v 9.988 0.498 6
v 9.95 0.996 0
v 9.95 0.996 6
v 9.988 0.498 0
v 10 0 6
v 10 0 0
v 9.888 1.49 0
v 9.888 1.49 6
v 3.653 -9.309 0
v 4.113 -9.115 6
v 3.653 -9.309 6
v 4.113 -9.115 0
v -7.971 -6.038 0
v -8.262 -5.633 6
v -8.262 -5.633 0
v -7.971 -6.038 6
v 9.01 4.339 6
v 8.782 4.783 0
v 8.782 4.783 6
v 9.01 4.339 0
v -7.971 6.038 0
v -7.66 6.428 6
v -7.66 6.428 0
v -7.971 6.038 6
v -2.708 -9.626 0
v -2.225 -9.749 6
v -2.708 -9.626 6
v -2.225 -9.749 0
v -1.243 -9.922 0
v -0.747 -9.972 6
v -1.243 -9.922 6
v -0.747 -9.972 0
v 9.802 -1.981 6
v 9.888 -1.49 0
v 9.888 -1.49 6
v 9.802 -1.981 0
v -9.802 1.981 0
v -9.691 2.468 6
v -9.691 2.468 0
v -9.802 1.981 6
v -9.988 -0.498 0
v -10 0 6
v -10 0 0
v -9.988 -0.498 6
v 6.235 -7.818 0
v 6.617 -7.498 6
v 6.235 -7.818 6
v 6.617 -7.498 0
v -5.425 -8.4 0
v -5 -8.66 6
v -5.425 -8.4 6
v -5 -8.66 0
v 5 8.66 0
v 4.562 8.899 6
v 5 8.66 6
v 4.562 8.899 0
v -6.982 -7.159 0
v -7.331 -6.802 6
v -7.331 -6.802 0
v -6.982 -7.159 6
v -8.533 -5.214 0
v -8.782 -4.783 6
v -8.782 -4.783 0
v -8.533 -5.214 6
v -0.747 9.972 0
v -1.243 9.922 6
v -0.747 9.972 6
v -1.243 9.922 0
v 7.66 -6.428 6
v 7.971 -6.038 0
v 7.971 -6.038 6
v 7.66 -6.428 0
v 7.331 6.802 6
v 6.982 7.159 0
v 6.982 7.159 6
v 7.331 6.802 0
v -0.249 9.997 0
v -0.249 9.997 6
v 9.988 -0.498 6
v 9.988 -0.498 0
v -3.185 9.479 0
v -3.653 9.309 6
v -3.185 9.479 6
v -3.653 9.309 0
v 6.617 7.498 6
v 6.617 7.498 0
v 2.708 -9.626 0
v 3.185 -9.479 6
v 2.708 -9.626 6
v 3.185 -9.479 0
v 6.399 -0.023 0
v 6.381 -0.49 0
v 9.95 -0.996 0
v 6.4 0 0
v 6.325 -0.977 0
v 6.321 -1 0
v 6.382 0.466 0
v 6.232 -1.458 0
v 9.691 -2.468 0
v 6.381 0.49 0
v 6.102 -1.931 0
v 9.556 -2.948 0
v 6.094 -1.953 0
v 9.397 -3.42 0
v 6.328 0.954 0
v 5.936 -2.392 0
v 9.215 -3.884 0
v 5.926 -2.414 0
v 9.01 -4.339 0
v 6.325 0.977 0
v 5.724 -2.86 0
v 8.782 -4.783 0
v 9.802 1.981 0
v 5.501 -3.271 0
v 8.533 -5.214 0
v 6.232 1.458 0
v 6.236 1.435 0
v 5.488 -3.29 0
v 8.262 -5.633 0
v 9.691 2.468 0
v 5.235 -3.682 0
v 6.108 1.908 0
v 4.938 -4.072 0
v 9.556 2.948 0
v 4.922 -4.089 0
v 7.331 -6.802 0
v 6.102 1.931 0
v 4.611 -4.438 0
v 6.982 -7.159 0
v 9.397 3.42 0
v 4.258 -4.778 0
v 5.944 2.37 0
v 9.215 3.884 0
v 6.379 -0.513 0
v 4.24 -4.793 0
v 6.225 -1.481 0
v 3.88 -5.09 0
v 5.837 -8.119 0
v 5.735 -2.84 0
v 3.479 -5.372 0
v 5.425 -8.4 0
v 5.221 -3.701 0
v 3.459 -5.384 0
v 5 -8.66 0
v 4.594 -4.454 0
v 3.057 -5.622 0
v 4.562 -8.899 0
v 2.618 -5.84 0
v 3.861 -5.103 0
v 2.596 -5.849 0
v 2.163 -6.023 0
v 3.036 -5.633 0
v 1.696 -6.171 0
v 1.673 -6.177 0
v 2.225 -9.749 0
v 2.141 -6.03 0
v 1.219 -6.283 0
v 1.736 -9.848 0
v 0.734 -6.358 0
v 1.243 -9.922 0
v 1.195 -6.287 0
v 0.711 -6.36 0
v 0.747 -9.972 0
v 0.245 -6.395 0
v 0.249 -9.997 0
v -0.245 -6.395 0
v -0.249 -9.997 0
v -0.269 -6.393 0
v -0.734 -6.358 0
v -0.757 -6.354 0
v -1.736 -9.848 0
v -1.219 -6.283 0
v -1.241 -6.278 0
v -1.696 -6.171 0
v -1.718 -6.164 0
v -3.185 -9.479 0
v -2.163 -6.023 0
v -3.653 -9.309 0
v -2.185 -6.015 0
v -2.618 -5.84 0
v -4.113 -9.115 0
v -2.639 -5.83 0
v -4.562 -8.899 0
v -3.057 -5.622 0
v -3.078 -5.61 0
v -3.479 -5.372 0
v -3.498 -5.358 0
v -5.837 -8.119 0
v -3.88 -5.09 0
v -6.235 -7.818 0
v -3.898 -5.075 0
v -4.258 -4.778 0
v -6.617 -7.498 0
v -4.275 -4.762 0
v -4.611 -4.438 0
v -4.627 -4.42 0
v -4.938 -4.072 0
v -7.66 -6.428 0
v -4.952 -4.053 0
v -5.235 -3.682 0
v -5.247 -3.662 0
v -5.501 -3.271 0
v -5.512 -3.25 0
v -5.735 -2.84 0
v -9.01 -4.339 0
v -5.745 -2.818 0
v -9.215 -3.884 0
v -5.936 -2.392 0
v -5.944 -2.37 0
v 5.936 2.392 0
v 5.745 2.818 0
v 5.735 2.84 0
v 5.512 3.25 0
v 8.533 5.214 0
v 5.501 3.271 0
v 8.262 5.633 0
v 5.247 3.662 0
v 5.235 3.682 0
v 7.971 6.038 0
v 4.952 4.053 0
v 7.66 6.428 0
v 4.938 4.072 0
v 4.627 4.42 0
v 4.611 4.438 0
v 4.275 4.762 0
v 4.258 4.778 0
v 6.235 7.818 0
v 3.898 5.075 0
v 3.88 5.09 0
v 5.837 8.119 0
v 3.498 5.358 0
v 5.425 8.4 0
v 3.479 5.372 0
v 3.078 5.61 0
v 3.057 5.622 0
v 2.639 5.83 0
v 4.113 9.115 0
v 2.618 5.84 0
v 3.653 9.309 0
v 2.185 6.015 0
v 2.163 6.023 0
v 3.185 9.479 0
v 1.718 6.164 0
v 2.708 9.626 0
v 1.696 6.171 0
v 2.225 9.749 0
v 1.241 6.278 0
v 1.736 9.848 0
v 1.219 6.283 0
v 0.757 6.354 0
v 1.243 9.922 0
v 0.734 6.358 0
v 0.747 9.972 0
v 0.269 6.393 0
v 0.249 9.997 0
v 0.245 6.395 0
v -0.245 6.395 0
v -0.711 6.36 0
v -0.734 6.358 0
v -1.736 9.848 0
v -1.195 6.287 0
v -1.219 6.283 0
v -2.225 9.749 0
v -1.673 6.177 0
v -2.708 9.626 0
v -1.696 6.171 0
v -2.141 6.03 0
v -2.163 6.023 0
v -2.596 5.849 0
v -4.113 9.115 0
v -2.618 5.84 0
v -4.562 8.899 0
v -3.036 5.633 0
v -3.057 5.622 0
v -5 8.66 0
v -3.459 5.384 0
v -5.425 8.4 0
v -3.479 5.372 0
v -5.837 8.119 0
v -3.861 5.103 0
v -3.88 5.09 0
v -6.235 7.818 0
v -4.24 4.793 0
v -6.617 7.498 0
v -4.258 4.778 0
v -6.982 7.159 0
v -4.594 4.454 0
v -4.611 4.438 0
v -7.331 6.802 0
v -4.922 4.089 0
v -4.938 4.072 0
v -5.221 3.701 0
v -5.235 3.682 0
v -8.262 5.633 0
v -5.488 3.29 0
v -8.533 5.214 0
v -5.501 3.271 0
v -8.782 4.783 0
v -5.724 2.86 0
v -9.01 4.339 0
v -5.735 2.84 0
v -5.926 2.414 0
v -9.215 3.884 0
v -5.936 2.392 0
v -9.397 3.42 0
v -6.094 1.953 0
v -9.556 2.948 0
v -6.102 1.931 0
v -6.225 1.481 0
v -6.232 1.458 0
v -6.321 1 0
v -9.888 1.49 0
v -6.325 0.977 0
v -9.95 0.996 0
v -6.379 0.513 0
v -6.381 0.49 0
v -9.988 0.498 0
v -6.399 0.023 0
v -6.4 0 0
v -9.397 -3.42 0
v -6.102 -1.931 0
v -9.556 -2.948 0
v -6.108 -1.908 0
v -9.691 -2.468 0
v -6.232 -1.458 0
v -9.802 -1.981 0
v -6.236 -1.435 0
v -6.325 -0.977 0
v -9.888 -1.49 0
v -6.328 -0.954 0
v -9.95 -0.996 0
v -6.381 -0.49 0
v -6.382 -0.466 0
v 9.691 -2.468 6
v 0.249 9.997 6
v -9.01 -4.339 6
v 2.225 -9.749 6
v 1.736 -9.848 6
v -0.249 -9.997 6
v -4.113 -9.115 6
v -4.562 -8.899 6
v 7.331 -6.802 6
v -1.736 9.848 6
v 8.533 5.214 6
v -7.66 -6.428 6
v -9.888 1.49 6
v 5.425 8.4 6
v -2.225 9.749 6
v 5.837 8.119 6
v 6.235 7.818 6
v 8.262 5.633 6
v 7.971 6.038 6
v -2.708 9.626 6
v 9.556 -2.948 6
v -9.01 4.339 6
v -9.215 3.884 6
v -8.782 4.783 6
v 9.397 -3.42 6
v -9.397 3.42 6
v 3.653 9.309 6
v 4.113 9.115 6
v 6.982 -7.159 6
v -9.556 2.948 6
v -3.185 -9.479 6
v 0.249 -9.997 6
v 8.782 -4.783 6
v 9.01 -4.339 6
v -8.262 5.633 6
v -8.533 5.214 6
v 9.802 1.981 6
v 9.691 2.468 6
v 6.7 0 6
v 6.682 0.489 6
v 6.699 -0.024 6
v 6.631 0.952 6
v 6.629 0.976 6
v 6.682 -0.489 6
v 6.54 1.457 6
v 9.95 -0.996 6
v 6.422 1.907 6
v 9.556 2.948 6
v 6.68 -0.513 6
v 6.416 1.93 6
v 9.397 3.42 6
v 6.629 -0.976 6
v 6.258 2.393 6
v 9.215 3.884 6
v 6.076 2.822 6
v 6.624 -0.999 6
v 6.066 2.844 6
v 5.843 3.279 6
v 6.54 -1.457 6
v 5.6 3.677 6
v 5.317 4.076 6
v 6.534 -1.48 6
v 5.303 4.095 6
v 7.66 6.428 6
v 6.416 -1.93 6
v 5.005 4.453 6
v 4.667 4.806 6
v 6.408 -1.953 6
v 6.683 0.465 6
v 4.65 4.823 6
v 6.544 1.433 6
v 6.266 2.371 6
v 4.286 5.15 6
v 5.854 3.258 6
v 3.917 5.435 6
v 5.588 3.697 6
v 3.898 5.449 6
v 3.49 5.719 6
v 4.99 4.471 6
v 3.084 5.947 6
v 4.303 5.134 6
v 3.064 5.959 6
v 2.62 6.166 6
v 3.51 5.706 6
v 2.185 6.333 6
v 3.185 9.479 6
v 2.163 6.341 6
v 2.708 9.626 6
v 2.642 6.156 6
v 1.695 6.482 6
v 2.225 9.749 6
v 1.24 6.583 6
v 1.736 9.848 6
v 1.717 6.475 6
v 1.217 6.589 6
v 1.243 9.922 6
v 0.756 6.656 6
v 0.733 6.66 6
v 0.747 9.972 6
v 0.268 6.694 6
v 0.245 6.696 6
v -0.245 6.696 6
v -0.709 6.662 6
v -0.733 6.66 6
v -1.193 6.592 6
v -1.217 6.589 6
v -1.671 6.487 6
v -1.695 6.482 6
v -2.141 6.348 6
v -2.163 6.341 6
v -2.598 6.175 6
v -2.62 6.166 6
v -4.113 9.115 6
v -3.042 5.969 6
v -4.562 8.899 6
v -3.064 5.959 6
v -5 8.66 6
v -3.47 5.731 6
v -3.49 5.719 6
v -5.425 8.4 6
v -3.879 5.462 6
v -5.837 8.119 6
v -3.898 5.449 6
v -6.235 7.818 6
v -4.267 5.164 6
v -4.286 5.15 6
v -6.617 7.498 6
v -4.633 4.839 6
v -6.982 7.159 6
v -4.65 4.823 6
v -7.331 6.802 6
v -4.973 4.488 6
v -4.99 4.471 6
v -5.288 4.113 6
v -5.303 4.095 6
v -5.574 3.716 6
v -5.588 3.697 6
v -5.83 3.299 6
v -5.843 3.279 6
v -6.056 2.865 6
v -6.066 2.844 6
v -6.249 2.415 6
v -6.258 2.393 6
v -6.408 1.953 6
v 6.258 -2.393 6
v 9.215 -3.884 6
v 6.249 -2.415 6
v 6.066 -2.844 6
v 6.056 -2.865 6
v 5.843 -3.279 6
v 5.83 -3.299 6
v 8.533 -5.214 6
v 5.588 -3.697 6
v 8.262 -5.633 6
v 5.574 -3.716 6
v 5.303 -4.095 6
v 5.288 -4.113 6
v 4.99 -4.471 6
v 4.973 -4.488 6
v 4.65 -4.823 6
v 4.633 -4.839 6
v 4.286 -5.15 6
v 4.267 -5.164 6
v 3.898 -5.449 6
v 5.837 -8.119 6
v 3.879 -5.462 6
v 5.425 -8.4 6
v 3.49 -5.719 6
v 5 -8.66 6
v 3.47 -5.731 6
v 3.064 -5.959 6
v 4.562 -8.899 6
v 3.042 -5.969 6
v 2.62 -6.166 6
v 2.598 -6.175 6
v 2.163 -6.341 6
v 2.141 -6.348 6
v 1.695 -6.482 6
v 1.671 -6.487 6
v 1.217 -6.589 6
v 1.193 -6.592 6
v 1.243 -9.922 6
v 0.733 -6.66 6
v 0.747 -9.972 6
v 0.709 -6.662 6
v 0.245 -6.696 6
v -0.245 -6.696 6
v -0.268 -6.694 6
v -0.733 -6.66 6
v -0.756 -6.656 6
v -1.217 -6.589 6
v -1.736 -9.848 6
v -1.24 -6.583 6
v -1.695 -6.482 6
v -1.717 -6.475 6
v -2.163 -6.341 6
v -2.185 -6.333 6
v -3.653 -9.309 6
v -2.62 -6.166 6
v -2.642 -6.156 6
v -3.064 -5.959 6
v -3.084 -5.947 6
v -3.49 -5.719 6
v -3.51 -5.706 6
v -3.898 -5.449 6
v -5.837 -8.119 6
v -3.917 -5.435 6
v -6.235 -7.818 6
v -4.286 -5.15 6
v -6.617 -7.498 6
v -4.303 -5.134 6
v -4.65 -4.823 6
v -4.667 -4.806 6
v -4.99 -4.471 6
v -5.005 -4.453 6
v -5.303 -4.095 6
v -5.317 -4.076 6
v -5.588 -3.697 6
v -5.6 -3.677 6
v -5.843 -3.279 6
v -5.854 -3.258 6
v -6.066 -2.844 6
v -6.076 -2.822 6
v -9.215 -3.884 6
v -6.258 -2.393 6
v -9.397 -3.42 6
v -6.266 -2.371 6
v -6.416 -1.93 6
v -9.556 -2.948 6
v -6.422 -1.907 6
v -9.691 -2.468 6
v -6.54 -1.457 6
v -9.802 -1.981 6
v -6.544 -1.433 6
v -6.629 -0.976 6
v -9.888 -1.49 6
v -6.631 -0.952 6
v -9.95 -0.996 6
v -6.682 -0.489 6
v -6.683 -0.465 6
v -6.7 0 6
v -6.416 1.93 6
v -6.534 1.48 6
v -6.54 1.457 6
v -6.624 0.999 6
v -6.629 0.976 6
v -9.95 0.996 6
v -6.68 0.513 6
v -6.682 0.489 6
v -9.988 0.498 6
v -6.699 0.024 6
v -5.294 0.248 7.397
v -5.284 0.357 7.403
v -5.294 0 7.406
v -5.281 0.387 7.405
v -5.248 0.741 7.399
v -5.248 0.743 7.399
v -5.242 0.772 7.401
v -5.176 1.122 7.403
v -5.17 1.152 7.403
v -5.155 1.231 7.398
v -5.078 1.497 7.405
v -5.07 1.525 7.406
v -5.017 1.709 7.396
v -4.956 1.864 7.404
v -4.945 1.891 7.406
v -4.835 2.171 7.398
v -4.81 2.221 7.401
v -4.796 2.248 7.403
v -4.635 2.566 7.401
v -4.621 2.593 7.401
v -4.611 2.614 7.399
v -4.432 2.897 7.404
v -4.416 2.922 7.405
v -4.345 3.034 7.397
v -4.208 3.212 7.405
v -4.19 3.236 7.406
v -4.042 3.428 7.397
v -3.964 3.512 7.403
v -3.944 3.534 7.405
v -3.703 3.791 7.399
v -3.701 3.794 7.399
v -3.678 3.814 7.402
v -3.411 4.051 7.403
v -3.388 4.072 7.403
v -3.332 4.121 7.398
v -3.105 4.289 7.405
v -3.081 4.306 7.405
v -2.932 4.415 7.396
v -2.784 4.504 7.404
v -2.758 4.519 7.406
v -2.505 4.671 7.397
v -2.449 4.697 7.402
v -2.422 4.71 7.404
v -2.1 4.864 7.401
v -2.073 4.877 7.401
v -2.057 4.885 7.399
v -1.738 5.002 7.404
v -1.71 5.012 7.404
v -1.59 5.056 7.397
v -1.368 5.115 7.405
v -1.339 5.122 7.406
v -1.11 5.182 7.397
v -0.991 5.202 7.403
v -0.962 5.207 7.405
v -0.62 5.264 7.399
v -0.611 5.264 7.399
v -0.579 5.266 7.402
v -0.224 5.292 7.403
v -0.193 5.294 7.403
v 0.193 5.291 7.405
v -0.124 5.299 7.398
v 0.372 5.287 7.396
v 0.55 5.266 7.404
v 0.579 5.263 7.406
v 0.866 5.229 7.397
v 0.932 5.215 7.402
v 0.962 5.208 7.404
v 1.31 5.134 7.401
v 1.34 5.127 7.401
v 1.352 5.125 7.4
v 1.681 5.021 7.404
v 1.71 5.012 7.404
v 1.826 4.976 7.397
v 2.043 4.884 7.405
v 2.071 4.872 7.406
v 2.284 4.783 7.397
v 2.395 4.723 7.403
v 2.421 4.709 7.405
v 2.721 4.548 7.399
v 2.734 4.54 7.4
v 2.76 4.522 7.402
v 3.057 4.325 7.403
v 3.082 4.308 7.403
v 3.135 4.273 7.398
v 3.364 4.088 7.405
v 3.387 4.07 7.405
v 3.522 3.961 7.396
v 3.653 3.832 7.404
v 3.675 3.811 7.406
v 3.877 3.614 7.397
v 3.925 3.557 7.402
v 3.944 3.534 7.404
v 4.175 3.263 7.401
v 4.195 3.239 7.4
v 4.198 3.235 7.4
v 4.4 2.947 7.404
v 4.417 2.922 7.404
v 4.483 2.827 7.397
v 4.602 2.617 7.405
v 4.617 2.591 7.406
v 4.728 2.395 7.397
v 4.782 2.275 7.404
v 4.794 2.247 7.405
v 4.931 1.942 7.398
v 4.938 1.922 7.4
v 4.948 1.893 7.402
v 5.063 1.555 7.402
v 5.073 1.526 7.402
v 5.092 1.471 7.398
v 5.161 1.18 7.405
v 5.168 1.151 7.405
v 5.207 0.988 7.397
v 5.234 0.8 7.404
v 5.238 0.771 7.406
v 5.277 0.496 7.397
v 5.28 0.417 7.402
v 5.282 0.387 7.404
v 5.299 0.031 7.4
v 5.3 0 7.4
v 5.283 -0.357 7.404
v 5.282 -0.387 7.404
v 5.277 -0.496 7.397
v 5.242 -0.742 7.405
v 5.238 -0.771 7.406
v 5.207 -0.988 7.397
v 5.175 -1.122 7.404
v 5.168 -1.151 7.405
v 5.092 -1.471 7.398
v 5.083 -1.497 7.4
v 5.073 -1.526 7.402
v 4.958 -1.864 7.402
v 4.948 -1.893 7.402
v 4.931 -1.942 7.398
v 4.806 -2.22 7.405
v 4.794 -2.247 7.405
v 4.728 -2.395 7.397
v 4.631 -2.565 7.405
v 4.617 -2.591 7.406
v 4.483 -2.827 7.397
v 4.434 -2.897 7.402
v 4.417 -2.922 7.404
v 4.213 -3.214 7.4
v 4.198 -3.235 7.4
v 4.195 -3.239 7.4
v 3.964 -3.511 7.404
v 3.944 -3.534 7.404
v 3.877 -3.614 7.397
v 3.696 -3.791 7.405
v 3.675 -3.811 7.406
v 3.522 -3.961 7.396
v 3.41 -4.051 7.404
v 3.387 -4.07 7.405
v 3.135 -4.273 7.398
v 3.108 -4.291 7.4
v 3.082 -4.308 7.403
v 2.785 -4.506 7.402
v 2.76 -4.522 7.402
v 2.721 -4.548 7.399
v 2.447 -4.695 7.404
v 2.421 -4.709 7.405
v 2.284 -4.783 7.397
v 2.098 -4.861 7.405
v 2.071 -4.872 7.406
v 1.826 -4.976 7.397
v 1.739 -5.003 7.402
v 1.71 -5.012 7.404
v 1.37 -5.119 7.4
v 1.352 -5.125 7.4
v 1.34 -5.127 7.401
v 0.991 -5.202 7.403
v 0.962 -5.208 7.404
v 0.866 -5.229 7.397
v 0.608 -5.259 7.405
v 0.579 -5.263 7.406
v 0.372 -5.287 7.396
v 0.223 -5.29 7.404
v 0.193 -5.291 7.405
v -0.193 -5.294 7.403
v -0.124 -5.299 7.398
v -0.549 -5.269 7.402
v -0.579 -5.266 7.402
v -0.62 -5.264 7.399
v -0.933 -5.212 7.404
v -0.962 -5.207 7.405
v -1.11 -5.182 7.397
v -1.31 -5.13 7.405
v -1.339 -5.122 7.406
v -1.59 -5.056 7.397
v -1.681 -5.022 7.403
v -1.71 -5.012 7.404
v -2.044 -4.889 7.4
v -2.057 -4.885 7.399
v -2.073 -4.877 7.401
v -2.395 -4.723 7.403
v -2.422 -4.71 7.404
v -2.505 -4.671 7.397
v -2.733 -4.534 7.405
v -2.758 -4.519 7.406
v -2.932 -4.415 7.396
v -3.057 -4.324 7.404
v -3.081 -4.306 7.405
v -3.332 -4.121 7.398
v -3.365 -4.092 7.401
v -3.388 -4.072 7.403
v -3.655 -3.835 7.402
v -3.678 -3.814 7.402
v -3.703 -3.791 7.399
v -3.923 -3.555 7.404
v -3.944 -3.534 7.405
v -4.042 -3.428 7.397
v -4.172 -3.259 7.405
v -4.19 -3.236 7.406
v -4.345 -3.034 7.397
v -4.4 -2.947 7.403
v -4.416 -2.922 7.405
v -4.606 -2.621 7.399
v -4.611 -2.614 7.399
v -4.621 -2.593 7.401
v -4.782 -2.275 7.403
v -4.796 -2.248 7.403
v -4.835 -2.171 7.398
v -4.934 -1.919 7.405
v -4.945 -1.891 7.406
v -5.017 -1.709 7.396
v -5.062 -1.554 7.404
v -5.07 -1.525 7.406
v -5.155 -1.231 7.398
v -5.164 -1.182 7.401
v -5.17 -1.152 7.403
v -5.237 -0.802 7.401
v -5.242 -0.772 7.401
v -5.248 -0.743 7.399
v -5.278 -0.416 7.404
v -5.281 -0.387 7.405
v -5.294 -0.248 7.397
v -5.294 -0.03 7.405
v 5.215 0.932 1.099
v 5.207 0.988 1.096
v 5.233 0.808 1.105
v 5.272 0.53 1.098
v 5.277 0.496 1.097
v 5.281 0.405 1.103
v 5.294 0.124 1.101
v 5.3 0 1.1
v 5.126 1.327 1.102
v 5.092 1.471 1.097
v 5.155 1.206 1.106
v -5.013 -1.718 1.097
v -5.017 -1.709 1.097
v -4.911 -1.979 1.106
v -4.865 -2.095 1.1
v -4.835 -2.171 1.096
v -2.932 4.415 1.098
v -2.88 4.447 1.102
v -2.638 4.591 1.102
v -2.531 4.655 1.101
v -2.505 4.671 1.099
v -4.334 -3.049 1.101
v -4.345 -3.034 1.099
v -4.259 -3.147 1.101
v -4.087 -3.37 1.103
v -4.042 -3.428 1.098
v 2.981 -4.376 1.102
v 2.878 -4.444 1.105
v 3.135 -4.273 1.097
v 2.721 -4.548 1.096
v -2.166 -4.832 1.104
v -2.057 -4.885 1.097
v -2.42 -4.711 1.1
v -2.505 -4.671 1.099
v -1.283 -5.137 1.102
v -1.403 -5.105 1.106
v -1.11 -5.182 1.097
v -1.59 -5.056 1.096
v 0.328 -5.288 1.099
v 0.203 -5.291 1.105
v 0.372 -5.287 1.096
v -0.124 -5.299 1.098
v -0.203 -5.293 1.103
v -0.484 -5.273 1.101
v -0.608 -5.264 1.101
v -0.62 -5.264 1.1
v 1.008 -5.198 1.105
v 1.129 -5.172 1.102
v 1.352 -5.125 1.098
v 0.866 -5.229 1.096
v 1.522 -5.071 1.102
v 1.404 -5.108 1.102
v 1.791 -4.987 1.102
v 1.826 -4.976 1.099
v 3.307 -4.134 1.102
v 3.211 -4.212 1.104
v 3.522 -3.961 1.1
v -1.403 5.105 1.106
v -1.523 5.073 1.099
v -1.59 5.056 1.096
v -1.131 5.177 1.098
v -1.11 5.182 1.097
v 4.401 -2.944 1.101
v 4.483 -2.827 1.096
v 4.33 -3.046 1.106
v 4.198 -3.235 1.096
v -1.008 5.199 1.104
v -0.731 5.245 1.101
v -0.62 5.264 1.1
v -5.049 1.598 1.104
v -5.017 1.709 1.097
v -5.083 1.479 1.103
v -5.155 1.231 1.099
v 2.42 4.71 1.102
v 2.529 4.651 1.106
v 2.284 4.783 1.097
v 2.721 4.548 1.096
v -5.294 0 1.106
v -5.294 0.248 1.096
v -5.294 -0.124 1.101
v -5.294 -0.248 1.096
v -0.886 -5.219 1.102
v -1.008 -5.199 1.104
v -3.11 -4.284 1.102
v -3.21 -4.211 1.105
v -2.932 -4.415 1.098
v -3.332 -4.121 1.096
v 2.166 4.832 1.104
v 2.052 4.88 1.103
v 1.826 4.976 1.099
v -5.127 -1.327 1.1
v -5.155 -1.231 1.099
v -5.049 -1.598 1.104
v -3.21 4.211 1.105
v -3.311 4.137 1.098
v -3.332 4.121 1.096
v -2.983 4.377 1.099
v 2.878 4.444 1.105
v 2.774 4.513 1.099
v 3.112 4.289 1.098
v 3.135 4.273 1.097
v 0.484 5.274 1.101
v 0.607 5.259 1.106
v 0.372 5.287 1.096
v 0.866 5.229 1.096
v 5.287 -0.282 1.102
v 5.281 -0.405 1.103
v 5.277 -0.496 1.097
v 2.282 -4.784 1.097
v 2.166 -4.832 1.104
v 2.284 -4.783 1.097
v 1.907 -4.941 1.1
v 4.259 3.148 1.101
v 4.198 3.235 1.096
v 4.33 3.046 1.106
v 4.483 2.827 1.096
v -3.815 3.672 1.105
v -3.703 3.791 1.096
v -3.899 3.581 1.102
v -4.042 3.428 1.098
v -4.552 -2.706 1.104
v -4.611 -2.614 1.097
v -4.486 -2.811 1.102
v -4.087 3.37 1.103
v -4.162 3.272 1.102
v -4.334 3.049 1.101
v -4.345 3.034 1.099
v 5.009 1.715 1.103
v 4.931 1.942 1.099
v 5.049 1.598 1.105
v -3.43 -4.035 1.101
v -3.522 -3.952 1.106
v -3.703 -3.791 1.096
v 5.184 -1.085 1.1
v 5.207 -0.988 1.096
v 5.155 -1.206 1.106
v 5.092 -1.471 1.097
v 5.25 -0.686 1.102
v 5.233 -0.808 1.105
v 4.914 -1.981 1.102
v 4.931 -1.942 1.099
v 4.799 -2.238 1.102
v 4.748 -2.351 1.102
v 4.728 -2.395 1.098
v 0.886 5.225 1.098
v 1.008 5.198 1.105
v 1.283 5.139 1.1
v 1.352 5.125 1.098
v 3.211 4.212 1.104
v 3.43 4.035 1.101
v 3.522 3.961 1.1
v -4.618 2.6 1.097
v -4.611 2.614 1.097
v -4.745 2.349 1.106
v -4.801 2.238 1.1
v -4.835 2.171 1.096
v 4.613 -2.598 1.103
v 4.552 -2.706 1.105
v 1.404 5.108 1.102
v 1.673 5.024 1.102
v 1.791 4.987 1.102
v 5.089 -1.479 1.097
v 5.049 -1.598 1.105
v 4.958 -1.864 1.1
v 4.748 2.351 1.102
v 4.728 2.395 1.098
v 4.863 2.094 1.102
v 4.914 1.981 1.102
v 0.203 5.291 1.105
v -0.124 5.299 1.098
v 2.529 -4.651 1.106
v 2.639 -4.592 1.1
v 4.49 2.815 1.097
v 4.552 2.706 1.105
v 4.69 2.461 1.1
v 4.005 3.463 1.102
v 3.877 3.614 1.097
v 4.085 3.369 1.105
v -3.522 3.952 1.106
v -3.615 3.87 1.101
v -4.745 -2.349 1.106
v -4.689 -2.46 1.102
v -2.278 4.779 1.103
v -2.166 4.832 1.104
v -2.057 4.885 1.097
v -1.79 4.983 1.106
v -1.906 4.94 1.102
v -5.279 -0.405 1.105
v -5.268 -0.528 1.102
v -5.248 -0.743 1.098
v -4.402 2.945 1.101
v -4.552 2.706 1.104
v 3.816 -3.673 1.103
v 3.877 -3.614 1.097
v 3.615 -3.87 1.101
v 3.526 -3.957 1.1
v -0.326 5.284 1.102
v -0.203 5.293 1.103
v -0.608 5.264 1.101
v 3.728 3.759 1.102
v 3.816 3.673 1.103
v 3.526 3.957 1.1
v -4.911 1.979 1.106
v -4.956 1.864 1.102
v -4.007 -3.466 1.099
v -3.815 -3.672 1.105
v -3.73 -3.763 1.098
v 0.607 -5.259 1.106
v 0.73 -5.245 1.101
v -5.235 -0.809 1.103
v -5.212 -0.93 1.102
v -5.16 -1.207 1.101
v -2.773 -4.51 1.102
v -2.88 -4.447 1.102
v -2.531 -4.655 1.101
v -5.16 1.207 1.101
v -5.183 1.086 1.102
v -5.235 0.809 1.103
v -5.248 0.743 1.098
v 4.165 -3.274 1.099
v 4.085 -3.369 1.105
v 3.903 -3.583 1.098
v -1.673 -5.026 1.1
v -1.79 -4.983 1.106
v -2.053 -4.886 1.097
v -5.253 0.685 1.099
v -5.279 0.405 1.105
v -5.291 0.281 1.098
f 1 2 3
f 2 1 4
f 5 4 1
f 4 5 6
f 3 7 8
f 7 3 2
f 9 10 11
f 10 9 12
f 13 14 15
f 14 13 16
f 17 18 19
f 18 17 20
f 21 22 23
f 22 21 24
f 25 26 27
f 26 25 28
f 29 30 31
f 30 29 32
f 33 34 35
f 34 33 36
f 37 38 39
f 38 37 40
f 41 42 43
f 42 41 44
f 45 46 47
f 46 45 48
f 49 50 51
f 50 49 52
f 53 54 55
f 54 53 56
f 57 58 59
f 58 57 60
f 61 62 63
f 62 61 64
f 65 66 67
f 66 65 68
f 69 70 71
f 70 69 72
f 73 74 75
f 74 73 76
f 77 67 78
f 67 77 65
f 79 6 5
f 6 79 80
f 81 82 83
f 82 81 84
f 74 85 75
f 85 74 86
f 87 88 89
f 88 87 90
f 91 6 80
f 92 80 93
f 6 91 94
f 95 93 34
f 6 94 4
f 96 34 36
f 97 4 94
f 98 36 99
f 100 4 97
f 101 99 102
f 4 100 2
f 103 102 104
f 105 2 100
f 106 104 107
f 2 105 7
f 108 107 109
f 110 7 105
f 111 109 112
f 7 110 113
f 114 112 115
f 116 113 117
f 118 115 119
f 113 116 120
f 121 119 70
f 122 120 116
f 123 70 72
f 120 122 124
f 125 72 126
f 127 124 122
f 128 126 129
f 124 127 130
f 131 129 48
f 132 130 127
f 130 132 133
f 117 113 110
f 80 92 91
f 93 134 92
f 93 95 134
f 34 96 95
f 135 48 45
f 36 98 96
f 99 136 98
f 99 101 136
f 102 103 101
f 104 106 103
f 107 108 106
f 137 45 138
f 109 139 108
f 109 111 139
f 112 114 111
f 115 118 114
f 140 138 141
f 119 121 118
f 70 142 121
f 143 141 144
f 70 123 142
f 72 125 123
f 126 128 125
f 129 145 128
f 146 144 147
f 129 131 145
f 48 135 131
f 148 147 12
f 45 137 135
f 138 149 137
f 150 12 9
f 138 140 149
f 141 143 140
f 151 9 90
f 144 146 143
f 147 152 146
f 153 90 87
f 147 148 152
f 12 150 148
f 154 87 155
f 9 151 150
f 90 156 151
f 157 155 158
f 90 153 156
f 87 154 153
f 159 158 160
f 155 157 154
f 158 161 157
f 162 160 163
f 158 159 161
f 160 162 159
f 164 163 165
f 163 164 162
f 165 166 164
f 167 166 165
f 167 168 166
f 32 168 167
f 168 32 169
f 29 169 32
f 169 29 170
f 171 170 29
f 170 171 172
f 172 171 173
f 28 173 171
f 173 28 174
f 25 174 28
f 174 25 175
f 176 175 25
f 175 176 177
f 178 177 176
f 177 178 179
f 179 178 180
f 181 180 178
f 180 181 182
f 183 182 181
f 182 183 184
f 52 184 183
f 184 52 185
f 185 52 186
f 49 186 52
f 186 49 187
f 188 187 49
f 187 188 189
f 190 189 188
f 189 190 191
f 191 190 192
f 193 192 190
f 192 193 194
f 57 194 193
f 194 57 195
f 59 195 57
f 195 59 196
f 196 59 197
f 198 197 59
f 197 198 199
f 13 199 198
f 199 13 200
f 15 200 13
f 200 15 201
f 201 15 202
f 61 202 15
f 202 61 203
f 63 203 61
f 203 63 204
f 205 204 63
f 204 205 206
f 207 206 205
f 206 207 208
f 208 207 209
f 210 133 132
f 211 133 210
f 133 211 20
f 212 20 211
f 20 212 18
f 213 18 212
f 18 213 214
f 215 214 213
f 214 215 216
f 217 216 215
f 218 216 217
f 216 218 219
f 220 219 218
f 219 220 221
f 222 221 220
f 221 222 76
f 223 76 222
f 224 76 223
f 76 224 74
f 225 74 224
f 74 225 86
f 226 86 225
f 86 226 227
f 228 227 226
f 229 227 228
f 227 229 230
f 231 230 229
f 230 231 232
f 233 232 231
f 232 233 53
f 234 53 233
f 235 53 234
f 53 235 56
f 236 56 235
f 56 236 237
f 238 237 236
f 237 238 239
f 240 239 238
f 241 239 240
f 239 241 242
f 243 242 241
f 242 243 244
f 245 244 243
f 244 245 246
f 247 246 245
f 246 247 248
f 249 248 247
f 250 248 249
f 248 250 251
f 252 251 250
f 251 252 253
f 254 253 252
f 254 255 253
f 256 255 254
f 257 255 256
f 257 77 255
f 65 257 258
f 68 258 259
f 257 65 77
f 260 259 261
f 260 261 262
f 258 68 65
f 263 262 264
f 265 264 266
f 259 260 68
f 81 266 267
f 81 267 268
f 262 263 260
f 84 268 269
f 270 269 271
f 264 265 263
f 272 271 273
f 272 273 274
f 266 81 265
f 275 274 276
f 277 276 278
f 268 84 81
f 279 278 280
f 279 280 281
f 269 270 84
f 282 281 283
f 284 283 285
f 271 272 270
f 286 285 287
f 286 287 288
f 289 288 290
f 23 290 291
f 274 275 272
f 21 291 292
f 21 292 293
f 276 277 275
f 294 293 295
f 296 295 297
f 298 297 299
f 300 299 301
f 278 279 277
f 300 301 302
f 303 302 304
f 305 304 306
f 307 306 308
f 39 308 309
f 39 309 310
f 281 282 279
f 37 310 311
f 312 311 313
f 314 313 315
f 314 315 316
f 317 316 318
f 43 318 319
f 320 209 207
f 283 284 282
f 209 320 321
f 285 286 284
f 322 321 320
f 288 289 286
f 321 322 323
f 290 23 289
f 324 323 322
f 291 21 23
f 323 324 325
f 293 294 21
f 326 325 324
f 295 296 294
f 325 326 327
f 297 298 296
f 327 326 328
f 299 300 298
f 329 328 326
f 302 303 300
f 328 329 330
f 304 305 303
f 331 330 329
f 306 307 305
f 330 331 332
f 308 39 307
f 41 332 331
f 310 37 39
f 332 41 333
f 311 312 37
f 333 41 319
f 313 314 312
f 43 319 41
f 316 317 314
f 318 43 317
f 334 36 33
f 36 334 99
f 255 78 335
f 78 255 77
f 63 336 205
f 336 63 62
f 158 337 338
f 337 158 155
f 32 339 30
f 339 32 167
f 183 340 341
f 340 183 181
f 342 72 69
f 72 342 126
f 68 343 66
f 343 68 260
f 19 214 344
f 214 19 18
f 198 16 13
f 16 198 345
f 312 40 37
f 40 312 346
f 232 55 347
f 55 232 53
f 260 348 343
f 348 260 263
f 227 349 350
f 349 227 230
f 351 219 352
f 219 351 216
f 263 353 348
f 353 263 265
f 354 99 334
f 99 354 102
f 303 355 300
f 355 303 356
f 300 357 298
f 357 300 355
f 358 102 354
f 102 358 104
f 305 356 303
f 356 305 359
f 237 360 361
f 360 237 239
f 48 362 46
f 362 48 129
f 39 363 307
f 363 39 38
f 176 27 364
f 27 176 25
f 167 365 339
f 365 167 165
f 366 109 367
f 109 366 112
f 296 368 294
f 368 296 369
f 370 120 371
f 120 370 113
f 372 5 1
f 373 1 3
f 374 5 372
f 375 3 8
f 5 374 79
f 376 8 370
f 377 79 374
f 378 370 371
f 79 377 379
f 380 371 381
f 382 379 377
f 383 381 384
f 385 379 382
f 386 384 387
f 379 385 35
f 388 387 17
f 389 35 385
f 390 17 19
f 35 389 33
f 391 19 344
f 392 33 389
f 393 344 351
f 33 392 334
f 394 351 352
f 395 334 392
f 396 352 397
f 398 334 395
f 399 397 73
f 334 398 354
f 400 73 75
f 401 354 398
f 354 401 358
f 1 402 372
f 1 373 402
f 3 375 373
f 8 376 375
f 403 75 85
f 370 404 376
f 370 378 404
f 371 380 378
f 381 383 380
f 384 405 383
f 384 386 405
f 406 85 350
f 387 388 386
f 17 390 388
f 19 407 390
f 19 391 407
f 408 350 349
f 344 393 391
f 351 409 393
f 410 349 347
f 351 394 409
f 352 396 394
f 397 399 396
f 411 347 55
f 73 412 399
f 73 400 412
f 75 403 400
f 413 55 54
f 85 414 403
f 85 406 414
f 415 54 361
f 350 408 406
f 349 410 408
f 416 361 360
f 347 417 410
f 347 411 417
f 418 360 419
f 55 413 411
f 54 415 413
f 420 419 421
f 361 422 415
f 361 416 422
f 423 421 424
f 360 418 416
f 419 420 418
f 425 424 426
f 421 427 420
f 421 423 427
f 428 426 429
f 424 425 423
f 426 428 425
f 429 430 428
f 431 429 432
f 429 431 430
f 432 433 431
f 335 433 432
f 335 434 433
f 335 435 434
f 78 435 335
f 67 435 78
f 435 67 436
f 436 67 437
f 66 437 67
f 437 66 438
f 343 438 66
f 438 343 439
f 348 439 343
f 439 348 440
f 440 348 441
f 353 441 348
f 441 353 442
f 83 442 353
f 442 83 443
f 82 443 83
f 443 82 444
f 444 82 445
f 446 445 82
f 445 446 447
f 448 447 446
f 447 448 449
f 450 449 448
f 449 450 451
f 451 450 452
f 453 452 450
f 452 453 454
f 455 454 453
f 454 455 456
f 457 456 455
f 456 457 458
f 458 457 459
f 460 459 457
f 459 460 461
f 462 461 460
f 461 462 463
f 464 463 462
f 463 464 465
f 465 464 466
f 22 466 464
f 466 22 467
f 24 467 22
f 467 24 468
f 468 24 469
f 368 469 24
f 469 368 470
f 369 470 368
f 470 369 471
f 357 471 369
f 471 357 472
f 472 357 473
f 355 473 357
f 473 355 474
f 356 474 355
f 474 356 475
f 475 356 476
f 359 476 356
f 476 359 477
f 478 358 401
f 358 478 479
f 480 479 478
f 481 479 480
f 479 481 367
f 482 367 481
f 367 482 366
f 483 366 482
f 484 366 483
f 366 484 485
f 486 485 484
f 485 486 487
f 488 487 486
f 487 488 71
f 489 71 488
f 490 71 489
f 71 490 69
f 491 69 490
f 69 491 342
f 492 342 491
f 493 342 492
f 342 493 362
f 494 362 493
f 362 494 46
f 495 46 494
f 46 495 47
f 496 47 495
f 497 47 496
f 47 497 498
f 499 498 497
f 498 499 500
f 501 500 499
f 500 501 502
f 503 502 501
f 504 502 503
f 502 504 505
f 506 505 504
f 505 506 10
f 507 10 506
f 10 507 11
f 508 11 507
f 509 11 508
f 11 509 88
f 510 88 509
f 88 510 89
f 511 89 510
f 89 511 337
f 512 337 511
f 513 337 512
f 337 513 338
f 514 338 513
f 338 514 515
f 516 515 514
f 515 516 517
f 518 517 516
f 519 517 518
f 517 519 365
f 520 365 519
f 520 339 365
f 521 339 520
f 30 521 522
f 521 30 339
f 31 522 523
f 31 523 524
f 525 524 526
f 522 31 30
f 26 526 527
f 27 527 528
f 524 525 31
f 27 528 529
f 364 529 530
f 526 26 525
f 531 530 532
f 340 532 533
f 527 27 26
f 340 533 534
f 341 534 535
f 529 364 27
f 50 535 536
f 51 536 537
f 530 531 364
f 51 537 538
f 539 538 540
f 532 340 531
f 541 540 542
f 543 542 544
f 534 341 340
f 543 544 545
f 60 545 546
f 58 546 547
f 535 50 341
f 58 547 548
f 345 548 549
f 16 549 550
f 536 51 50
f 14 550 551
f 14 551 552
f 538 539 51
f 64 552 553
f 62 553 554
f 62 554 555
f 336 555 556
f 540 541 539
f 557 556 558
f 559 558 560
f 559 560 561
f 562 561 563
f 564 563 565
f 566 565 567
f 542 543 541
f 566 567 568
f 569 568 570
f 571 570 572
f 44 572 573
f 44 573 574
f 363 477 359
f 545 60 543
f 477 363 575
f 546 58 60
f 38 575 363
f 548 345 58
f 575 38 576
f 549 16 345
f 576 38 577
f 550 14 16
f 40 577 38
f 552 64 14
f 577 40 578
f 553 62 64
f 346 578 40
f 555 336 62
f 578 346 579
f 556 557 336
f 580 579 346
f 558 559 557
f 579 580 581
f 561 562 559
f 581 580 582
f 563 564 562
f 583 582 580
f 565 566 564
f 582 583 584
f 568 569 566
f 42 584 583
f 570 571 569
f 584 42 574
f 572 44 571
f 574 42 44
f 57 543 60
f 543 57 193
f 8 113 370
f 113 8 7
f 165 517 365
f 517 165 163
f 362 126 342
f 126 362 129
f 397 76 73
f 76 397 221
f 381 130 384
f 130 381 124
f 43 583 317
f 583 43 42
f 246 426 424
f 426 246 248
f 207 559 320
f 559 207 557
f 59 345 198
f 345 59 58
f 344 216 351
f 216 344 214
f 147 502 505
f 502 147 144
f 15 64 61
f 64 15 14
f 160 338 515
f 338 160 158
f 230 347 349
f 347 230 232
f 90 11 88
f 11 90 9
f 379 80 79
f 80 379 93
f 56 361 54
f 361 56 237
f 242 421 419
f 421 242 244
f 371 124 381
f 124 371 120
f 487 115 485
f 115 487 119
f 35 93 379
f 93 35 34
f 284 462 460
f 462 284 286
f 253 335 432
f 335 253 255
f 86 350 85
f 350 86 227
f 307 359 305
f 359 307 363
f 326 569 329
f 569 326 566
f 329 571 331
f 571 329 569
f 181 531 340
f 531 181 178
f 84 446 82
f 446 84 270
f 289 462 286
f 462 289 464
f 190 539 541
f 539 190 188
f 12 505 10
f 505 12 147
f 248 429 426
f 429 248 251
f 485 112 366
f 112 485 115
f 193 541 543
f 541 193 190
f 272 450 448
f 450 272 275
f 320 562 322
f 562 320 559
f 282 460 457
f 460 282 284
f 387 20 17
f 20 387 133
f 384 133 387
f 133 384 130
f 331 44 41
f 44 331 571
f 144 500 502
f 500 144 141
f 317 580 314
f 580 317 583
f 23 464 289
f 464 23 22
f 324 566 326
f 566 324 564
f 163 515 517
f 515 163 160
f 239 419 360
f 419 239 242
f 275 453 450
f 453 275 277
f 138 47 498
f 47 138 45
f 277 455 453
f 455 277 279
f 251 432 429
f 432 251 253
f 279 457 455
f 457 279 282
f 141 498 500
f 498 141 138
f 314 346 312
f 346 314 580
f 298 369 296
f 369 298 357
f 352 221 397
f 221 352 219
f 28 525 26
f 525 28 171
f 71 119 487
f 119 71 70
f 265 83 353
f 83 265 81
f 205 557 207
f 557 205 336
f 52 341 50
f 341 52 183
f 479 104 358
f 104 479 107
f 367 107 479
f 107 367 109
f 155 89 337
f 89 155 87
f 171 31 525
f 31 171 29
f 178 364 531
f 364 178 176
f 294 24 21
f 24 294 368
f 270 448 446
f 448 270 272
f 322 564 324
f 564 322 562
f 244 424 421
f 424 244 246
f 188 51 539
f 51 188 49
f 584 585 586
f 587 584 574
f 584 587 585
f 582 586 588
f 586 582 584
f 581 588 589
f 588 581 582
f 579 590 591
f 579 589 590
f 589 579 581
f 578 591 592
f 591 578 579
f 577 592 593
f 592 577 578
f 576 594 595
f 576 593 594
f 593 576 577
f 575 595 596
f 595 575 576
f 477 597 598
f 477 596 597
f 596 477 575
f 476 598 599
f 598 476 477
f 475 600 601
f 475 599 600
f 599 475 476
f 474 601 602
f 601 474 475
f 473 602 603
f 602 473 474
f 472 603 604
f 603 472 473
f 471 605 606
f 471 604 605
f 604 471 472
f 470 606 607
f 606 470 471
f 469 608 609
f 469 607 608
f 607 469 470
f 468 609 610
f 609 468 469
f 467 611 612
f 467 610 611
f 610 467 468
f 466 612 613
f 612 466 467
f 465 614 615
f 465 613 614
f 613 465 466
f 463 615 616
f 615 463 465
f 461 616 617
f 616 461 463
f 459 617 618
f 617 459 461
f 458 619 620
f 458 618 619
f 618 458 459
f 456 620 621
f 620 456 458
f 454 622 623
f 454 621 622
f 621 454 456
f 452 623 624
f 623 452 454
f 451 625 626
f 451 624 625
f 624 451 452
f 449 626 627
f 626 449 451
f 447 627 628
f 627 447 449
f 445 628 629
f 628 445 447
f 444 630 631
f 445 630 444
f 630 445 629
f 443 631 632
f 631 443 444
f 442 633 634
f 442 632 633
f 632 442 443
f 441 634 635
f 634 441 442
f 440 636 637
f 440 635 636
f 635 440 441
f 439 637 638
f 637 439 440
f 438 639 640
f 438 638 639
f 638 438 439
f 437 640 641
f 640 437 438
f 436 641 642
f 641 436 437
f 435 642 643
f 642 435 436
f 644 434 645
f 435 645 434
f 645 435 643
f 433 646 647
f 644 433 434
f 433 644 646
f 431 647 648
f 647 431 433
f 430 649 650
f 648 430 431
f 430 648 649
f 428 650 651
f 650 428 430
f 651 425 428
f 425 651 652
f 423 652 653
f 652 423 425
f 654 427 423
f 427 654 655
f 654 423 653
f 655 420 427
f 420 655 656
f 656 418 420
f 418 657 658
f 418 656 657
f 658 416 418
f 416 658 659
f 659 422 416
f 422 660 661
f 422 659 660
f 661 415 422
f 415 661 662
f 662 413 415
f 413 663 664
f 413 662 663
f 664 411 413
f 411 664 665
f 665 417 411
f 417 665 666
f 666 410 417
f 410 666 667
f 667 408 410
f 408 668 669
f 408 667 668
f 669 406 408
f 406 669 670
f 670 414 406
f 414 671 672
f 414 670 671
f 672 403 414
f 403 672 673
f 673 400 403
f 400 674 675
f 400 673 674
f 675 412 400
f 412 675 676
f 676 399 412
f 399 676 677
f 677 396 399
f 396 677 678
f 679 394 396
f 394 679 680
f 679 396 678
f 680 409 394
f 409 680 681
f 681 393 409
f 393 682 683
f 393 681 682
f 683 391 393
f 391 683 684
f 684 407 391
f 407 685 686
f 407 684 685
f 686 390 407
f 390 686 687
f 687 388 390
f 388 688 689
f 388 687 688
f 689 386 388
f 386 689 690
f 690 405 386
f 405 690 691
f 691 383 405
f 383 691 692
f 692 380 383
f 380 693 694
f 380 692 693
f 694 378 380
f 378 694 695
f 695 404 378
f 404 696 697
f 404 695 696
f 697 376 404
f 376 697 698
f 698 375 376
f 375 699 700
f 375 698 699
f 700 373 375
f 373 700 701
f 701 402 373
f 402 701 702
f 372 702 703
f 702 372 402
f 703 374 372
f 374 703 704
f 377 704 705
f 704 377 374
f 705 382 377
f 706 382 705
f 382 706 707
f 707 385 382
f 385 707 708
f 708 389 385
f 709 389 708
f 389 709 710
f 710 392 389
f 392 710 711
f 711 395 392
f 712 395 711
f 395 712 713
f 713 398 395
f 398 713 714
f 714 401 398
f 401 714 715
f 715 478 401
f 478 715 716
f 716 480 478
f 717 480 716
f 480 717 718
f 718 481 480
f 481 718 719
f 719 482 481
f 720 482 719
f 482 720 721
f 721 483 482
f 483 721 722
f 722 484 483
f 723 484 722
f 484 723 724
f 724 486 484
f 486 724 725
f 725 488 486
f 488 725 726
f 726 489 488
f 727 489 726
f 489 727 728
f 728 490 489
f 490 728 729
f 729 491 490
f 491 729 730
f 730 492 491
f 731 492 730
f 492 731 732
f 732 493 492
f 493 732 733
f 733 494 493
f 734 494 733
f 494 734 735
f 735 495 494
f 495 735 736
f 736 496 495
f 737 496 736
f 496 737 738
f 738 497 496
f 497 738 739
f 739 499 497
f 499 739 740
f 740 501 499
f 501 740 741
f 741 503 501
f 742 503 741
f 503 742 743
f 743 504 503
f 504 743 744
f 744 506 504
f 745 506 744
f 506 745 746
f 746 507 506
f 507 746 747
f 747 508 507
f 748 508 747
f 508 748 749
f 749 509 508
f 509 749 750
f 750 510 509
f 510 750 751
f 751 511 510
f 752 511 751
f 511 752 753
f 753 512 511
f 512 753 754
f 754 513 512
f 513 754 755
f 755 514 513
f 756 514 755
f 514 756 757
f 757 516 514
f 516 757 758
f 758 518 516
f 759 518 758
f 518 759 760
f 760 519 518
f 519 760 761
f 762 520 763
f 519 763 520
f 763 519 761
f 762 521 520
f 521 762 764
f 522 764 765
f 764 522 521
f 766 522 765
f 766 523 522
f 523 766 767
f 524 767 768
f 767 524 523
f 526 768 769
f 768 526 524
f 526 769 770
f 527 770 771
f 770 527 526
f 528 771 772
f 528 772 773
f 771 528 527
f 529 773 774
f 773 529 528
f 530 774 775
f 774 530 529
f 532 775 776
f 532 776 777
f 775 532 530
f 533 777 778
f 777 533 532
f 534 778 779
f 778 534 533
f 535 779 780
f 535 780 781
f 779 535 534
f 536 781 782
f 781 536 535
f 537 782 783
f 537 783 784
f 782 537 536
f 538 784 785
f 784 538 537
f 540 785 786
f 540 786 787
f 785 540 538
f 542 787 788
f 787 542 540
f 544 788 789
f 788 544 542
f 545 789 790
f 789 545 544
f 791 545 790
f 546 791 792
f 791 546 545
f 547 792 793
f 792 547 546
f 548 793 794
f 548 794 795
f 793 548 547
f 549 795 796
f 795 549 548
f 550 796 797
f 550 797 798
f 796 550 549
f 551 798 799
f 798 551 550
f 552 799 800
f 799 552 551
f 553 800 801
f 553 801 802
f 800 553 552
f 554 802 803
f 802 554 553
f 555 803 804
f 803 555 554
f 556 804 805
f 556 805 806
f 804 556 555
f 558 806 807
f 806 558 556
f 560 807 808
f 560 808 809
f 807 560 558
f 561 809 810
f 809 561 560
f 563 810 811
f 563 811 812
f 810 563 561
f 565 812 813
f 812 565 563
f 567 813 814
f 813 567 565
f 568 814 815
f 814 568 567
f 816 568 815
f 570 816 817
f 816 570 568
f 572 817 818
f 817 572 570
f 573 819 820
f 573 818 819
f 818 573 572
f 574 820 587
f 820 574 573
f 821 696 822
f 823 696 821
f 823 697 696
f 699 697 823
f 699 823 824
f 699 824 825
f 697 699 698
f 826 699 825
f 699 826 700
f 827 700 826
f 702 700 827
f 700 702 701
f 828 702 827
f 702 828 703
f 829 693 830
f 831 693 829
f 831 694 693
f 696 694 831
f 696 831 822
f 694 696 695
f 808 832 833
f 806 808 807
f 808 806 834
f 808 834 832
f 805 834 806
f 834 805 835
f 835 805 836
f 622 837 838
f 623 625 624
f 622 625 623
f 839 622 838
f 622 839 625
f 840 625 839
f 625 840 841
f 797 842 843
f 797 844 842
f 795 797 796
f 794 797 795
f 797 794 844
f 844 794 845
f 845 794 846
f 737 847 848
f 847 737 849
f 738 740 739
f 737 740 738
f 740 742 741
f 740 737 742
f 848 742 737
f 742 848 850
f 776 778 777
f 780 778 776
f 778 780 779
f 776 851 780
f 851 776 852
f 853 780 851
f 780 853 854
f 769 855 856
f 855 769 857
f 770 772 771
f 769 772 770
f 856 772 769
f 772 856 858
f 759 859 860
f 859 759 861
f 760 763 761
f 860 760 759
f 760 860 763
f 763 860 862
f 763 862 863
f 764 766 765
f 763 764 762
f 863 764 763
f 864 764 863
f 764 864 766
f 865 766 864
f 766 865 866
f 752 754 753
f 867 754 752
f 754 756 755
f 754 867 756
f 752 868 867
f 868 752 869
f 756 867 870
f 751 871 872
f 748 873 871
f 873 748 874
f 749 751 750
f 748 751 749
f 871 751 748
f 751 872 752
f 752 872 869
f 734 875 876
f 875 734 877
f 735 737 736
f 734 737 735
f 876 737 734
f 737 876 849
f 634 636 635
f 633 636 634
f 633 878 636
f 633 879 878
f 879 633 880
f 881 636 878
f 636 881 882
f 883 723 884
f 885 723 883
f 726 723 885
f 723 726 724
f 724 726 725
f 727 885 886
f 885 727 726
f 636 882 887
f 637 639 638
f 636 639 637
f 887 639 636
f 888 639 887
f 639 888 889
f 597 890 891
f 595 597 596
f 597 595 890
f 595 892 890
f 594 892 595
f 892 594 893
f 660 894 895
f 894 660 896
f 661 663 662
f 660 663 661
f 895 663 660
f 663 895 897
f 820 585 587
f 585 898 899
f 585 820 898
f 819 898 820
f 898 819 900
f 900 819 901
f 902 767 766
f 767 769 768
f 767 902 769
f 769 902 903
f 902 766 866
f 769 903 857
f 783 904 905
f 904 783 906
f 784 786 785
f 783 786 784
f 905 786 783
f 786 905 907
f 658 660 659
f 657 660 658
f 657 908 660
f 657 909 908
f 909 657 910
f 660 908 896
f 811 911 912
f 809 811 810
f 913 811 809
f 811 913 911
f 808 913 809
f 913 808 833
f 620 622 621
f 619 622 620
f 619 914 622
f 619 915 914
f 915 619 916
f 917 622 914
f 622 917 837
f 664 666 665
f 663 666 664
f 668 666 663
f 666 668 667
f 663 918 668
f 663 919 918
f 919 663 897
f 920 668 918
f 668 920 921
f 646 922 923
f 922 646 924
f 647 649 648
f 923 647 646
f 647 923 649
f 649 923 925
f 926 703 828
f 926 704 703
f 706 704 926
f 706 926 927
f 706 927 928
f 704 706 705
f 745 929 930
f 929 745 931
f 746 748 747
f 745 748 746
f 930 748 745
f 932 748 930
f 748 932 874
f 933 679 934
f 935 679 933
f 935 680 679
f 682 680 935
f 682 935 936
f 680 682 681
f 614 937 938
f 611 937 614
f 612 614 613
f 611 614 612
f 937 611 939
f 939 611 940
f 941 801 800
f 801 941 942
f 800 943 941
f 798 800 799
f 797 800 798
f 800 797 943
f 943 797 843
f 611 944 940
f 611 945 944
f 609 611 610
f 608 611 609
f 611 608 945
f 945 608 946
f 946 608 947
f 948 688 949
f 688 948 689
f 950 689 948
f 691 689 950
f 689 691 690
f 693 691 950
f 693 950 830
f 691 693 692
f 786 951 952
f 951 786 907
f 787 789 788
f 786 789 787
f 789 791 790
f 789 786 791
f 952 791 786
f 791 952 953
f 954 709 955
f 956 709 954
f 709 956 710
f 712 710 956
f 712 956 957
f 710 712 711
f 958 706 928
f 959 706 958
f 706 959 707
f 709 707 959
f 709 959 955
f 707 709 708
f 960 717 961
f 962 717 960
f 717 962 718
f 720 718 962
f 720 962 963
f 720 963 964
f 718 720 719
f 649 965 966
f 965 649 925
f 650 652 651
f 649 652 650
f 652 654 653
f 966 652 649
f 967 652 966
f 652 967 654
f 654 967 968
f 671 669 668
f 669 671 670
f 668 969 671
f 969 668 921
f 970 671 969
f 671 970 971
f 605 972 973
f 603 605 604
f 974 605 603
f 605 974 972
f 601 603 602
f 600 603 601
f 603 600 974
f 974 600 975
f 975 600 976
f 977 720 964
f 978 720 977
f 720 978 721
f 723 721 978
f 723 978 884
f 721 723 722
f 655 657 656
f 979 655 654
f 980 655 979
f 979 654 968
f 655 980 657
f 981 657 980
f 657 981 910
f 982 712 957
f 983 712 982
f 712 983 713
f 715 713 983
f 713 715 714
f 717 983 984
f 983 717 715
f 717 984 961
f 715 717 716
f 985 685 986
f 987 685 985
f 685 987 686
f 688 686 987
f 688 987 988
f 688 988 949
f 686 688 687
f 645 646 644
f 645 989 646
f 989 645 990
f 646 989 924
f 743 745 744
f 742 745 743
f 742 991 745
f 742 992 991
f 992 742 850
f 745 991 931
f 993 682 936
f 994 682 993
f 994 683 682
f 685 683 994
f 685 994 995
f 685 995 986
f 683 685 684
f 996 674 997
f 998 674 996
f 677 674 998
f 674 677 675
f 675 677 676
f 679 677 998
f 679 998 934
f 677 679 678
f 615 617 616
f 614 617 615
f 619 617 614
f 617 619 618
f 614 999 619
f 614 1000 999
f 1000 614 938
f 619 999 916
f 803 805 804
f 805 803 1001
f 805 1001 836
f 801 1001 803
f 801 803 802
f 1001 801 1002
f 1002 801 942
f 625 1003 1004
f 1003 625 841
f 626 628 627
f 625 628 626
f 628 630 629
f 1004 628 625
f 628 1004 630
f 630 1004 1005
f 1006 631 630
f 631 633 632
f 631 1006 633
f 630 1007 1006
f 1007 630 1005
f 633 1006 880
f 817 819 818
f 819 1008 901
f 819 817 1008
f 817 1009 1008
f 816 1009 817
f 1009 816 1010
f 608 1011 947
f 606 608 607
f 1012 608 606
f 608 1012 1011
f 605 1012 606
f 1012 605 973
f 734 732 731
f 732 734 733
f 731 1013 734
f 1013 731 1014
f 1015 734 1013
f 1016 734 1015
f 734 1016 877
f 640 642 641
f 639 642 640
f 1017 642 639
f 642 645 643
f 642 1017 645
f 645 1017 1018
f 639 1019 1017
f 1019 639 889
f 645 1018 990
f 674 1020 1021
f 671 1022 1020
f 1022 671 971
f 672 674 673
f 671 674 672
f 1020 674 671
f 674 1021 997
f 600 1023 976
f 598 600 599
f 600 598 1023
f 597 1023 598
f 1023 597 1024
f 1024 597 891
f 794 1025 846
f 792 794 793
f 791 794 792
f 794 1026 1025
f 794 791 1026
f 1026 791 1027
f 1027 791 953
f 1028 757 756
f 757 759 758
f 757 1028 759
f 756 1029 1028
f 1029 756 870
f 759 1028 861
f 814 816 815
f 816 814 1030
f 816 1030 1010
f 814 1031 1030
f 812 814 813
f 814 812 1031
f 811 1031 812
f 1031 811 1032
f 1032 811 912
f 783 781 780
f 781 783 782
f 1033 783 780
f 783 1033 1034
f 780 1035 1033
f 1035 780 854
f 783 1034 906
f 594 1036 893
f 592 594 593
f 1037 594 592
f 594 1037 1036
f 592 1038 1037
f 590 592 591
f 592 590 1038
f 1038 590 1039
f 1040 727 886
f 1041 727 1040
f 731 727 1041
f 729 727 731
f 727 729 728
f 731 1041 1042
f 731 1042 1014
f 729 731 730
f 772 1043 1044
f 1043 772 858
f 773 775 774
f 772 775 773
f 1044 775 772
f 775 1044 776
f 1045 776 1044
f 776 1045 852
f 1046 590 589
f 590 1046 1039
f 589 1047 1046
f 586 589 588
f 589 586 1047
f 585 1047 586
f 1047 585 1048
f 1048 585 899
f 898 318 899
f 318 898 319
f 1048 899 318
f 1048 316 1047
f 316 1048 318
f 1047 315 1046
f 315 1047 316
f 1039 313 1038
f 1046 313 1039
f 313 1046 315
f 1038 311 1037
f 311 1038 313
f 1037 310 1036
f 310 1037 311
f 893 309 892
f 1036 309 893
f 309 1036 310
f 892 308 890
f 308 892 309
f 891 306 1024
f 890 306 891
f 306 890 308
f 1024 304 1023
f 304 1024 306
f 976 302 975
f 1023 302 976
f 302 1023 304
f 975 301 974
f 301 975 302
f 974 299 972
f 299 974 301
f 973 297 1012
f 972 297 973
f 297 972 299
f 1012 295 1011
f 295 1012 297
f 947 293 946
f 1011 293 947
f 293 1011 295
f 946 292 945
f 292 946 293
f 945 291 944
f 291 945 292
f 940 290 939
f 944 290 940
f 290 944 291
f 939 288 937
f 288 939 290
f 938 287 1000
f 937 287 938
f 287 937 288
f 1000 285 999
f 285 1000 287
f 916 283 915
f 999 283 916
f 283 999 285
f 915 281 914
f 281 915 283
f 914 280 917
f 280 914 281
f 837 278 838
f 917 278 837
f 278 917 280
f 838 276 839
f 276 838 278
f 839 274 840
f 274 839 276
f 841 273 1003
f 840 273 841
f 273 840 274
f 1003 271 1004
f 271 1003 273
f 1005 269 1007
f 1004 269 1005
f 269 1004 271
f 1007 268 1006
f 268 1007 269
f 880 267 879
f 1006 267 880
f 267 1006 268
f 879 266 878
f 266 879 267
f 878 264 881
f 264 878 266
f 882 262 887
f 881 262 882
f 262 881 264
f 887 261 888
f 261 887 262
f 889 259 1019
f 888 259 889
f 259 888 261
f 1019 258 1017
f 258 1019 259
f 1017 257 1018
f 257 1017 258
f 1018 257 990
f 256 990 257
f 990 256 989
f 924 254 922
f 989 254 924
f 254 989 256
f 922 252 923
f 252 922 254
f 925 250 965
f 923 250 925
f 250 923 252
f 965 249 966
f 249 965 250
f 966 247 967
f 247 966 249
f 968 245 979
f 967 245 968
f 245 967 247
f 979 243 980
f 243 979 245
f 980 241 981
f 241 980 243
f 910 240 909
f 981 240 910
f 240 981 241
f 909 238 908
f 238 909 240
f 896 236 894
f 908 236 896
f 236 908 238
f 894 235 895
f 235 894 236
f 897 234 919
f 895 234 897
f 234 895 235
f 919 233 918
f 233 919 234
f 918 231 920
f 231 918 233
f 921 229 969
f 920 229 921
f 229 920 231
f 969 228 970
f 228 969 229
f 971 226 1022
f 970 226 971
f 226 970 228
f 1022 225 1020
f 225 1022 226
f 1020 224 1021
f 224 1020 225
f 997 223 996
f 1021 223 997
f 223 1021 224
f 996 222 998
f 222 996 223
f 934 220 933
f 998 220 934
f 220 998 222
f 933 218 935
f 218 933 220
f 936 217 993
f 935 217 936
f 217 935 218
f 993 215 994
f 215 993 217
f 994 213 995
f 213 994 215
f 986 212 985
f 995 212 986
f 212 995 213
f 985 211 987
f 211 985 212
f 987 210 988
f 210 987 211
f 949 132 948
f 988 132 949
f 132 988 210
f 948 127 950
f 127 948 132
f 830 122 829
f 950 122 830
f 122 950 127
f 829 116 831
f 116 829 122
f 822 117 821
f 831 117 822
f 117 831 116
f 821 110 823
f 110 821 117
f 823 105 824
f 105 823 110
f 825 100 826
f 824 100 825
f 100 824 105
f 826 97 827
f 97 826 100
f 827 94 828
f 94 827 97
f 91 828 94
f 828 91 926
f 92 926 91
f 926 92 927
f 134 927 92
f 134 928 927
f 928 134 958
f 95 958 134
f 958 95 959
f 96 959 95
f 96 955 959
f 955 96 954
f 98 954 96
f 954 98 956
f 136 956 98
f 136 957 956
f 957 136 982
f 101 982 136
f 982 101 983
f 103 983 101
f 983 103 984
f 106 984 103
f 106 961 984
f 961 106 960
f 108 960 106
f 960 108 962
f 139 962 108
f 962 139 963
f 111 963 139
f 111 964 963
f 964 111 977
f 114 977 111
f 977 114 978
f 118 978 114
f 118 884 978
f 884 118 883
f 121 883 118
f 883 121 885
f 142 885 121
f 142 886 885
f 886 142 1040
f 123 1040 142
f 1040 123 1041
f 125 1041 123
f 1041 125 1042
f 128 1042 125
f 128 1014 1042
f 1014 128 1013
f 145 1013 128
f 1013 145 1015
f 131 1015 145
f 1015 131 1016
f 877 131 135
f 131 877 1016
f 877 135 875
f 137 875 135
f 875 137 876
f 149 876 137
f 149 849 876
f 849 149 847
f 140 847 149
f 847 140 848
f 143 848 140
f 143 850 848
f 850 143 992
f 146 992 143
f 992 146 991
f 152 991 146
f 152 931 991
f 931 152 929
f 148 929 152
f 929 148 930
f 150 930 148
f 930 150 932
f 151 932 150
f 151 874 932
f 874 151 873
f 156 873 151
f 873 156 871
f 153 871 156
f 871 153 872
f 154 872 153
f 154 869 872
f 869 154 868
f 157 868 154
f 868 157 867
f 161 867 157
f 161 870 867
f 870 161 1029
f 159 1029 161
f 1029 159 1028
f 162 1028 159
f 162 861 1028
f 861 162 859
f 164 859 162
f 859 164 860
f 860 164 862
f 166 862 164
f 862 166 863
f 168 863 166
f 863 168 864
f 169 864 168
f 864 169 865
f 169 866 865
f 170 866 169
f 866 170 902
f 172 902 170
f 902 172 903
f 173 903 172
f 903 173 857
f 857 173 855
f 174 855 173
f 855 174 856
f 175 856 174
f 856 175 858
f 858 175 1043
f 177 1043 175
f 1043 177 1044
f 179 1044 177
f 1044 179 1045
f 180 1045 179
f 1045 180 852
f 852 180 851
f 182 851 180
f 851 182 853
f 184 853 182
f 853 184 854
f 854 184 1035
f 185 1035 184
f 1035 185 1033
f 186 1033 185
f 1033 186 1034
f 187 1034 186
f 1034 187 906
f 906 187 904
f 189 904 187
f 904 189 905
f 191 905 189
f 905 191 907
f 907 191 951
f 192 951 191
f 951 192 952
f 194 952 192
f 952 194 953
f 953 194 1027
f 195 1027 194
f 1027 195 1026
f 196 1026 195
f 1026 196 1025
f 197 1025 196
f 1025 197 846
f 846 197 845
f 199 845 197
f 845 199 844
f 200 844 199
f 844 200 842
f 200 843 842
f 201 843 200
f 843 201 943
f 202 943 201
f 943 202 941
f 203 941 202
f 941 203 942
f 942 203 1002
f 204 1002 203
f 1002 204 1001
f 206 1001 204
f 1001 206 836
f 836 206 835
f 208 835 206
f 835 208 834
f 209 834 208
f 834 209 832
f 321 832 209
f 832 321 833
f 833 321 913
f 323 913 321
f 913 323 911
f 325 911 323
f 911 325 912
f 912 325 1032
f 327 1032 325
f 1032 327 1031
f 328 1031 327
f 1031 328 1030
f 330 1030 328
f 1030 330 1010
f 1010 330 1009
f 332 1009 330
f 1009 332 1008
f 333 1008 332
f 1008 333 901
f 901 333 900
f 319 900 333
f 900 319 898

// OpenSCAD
// file: fillets.scad
$fa = 1;
$fs = 0.5;

module fillet (r, h)
{
    rotate_extrude ()
    translate ([r, 0, 0])
    polygon ([[0, 0], [0, h], [h, 0]]);
}

module fillet_mask (r, h)
{
    rotate_extrude ()
    translate ([r-h, 0, 0])
    polygon ([[h + 0.1, h + 0.1], [-0.1, h + 0.1], [h + 0.1, -0.1]]);
}

fillet_mask (r=10, h=1.5);
// main file
use <fillets.scad>

shaft_diameter = 10;
fillet_height = 1.5;
body_height = 6;

clearance = 0.3;

$fa = 1;
$fs = 0.5;

// body
difference () {
    union () {
        cylinder (d=shaft_diameter + 10, h=body_height);
        // outer fillet
        translate ([0, 0, body_height - 0.1])
        fillet (shaft_diameter/2 + clearance - 0.1, fillet_height + 0.1);
    }

    // shaft
    translate ([0, 0, -0.1])
    cylinder (
        r=shaft_diameter/2 + clearance,
        h=body_height + 0.2 + fillet_height
    );

    // inner fillet
    translate ([0, 0, -0.1])
    fillet (shaft_diameter/2 - 0.1, fillet_height + 0.1);
}
